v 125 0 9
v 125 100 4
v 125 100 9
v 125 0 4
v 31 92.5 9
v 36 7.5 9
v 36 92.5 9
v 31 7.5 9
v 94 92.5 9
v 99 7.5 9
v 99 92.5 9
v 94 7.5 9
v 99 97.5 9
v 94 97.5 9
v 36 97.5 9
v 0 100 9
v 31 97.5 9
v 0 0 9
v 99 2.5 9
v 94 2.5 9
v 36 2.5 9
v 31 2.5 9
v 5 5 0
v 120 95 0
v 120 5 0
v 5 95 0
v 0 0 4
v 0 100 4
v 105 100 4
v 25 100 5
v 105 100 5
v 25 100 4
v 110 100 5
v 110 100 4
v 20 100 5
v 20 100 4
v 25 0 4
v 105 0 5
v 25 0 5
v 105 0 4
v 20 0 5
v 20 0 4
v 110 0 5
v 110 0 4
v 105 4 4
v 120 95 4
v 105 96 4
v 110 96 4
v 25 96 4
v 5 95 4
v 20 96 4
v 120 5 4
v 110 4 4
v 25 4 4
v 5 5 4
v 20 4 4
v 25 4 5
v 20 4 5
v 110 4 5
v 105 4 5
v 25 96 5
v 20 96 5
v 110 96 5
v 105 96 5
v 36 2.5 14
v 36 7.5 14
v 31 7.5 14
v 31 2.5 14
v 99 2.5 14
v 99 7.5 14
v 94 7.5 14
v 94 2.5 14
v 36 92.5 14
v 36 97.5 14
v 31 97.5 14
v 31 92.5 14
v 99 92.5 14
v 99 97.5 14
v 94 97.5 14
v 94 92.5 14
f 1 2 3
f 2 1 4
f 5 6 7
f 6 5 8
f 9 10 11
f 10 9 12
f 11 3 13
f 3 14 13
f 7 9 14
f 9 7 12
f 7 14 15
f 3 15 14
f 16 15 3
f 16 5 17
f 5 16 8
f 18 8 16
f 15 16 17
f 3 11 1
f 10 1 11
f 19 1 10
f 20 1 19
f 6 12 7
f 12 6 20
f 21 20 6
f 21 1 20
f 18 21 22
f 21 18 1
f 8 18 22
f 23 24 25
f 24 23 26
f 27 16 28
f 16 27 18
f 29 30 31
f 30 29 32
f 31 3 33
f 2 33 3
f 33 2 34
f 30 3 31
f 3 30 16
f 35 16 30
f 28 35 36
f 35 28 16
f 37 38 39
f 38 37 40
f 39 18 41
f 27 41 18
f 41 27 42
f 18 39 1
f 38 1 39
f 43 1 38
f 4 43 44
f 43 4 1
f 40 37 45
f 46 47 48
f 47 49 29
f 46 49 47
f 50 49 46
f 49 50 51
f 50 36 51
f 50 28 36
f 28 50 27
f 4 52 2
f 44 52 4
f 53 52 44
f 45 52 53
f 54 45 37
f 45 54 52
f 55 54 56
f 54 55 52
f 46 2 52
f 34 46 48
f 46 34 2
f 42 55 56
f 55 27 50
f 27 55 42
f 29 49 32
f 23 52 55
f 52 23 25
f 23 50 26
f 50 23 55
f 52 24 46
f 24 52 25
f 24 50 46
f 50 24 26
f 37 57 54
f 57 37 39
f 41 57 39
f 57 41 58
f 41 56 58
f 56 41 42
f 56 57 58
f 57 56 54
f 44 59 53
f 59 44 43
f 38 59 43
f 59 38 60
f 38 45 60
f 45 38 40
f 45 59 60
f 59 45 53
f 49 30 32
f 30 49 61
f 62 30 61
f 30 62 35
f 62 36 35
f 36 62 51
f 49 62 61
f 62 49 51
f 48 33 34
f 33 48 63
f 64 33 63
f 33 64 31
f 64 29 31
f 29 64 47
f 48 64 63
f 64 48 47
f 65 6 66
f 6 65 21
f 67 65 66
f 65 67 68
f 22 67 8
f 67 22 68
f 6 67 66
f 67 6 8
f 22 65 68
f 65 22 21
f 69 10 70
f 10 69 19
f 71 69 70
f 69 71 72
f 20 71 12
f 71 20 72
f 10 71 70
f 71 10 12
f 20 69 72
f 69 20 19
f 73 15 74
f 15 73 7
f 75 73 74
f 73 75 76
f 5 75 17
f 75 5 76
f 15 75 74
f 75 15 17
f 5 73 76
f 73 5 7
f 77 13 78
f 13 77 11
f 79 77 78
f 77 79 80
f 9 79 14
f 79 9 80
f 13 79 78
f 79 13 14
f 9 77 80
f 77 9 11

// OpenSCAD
// file: hEX-hAP-Vars.scad
InnerW=115;
InnerD=90;
LipH=4;
Wall=5;
TabX=20;

DW=Wall*2;
OuterW=InnerW+DW;
OuterD=InnerD+DW;
Buff=1;
DB=Buff*2;
// main file
include <hEX-hAP-Vars.scad>;
InnerH=0;
PoleDistY=90;
PoleDistX=63;
PoleSQ=5;
PoleH=5;
OuterH=LipH+Wall;

PoleZ=PoleH;
PoleX1=(OuterW/2)-(PoleDistX/2);
PoleY1=((OuterD-Wall)/2)-(PoleDistY/2);
PoleX2=(OuterW/2)-(PoleDistX/2)+PoleDistX;
PoleY2=((OuterD-Wall)/2)-(PoleDistY/2)+PoleDistY;


difference()
{
  cube([OuterW,OuterD,OuterH]);
    //Stacking lip
  translate([-Buff,-Buff,-Buff]) cube([OuterW+DB+Buff,Wall+Buff,LipH+Buff]);
  translate([-Buff,-Buff,-Buff]) cube([Wall+Buff,OuterD+DB,LipH+Buff]);
  translate([OuterW-Wall,-Buff,-Buff]) cube([Wall+Buff,OuterD+Buff,LipH+Buff]);
  translate([-Buff,OuterD-Wall,-Buff]) cube([OuterW+DW+Buff,Wall+DB+Buff,LipH+Buff]);
  // Prytabs
  translate([TabX,-Buff,LipH-Buff]) cube([Wall,Wall,DB]);
  translate([OuterW-TabX,-Buff,LipH-Buff]) cube([Wall,Wall,DB]);
  translate([TabX,InnerD+Wall+Buff,LipH-Buff]) cube([Wall,Wall,DB]);
  translate([OuterW-TabX,InnerD+Wall+Buff,LipH-Buff]) cube([Wall,Wall,DB]);
}

translate([PoleX1,PoleY1,OuterH]) cube([PoleSQ,PoleSQ,PoleZ]);
translate([PoleX2,PoleY1,OuterH]) cube([PoleSQ,PoleSQ,PoleZ]);
translate([PoleX1,PoleY2,OuterH]) cube([PoleSQ,PoleSQ,PoleZ]);
translate([PoleX2,PoleY2,OuterH]) cube([PoleSQ,PoleSQ,PoleZ]);
